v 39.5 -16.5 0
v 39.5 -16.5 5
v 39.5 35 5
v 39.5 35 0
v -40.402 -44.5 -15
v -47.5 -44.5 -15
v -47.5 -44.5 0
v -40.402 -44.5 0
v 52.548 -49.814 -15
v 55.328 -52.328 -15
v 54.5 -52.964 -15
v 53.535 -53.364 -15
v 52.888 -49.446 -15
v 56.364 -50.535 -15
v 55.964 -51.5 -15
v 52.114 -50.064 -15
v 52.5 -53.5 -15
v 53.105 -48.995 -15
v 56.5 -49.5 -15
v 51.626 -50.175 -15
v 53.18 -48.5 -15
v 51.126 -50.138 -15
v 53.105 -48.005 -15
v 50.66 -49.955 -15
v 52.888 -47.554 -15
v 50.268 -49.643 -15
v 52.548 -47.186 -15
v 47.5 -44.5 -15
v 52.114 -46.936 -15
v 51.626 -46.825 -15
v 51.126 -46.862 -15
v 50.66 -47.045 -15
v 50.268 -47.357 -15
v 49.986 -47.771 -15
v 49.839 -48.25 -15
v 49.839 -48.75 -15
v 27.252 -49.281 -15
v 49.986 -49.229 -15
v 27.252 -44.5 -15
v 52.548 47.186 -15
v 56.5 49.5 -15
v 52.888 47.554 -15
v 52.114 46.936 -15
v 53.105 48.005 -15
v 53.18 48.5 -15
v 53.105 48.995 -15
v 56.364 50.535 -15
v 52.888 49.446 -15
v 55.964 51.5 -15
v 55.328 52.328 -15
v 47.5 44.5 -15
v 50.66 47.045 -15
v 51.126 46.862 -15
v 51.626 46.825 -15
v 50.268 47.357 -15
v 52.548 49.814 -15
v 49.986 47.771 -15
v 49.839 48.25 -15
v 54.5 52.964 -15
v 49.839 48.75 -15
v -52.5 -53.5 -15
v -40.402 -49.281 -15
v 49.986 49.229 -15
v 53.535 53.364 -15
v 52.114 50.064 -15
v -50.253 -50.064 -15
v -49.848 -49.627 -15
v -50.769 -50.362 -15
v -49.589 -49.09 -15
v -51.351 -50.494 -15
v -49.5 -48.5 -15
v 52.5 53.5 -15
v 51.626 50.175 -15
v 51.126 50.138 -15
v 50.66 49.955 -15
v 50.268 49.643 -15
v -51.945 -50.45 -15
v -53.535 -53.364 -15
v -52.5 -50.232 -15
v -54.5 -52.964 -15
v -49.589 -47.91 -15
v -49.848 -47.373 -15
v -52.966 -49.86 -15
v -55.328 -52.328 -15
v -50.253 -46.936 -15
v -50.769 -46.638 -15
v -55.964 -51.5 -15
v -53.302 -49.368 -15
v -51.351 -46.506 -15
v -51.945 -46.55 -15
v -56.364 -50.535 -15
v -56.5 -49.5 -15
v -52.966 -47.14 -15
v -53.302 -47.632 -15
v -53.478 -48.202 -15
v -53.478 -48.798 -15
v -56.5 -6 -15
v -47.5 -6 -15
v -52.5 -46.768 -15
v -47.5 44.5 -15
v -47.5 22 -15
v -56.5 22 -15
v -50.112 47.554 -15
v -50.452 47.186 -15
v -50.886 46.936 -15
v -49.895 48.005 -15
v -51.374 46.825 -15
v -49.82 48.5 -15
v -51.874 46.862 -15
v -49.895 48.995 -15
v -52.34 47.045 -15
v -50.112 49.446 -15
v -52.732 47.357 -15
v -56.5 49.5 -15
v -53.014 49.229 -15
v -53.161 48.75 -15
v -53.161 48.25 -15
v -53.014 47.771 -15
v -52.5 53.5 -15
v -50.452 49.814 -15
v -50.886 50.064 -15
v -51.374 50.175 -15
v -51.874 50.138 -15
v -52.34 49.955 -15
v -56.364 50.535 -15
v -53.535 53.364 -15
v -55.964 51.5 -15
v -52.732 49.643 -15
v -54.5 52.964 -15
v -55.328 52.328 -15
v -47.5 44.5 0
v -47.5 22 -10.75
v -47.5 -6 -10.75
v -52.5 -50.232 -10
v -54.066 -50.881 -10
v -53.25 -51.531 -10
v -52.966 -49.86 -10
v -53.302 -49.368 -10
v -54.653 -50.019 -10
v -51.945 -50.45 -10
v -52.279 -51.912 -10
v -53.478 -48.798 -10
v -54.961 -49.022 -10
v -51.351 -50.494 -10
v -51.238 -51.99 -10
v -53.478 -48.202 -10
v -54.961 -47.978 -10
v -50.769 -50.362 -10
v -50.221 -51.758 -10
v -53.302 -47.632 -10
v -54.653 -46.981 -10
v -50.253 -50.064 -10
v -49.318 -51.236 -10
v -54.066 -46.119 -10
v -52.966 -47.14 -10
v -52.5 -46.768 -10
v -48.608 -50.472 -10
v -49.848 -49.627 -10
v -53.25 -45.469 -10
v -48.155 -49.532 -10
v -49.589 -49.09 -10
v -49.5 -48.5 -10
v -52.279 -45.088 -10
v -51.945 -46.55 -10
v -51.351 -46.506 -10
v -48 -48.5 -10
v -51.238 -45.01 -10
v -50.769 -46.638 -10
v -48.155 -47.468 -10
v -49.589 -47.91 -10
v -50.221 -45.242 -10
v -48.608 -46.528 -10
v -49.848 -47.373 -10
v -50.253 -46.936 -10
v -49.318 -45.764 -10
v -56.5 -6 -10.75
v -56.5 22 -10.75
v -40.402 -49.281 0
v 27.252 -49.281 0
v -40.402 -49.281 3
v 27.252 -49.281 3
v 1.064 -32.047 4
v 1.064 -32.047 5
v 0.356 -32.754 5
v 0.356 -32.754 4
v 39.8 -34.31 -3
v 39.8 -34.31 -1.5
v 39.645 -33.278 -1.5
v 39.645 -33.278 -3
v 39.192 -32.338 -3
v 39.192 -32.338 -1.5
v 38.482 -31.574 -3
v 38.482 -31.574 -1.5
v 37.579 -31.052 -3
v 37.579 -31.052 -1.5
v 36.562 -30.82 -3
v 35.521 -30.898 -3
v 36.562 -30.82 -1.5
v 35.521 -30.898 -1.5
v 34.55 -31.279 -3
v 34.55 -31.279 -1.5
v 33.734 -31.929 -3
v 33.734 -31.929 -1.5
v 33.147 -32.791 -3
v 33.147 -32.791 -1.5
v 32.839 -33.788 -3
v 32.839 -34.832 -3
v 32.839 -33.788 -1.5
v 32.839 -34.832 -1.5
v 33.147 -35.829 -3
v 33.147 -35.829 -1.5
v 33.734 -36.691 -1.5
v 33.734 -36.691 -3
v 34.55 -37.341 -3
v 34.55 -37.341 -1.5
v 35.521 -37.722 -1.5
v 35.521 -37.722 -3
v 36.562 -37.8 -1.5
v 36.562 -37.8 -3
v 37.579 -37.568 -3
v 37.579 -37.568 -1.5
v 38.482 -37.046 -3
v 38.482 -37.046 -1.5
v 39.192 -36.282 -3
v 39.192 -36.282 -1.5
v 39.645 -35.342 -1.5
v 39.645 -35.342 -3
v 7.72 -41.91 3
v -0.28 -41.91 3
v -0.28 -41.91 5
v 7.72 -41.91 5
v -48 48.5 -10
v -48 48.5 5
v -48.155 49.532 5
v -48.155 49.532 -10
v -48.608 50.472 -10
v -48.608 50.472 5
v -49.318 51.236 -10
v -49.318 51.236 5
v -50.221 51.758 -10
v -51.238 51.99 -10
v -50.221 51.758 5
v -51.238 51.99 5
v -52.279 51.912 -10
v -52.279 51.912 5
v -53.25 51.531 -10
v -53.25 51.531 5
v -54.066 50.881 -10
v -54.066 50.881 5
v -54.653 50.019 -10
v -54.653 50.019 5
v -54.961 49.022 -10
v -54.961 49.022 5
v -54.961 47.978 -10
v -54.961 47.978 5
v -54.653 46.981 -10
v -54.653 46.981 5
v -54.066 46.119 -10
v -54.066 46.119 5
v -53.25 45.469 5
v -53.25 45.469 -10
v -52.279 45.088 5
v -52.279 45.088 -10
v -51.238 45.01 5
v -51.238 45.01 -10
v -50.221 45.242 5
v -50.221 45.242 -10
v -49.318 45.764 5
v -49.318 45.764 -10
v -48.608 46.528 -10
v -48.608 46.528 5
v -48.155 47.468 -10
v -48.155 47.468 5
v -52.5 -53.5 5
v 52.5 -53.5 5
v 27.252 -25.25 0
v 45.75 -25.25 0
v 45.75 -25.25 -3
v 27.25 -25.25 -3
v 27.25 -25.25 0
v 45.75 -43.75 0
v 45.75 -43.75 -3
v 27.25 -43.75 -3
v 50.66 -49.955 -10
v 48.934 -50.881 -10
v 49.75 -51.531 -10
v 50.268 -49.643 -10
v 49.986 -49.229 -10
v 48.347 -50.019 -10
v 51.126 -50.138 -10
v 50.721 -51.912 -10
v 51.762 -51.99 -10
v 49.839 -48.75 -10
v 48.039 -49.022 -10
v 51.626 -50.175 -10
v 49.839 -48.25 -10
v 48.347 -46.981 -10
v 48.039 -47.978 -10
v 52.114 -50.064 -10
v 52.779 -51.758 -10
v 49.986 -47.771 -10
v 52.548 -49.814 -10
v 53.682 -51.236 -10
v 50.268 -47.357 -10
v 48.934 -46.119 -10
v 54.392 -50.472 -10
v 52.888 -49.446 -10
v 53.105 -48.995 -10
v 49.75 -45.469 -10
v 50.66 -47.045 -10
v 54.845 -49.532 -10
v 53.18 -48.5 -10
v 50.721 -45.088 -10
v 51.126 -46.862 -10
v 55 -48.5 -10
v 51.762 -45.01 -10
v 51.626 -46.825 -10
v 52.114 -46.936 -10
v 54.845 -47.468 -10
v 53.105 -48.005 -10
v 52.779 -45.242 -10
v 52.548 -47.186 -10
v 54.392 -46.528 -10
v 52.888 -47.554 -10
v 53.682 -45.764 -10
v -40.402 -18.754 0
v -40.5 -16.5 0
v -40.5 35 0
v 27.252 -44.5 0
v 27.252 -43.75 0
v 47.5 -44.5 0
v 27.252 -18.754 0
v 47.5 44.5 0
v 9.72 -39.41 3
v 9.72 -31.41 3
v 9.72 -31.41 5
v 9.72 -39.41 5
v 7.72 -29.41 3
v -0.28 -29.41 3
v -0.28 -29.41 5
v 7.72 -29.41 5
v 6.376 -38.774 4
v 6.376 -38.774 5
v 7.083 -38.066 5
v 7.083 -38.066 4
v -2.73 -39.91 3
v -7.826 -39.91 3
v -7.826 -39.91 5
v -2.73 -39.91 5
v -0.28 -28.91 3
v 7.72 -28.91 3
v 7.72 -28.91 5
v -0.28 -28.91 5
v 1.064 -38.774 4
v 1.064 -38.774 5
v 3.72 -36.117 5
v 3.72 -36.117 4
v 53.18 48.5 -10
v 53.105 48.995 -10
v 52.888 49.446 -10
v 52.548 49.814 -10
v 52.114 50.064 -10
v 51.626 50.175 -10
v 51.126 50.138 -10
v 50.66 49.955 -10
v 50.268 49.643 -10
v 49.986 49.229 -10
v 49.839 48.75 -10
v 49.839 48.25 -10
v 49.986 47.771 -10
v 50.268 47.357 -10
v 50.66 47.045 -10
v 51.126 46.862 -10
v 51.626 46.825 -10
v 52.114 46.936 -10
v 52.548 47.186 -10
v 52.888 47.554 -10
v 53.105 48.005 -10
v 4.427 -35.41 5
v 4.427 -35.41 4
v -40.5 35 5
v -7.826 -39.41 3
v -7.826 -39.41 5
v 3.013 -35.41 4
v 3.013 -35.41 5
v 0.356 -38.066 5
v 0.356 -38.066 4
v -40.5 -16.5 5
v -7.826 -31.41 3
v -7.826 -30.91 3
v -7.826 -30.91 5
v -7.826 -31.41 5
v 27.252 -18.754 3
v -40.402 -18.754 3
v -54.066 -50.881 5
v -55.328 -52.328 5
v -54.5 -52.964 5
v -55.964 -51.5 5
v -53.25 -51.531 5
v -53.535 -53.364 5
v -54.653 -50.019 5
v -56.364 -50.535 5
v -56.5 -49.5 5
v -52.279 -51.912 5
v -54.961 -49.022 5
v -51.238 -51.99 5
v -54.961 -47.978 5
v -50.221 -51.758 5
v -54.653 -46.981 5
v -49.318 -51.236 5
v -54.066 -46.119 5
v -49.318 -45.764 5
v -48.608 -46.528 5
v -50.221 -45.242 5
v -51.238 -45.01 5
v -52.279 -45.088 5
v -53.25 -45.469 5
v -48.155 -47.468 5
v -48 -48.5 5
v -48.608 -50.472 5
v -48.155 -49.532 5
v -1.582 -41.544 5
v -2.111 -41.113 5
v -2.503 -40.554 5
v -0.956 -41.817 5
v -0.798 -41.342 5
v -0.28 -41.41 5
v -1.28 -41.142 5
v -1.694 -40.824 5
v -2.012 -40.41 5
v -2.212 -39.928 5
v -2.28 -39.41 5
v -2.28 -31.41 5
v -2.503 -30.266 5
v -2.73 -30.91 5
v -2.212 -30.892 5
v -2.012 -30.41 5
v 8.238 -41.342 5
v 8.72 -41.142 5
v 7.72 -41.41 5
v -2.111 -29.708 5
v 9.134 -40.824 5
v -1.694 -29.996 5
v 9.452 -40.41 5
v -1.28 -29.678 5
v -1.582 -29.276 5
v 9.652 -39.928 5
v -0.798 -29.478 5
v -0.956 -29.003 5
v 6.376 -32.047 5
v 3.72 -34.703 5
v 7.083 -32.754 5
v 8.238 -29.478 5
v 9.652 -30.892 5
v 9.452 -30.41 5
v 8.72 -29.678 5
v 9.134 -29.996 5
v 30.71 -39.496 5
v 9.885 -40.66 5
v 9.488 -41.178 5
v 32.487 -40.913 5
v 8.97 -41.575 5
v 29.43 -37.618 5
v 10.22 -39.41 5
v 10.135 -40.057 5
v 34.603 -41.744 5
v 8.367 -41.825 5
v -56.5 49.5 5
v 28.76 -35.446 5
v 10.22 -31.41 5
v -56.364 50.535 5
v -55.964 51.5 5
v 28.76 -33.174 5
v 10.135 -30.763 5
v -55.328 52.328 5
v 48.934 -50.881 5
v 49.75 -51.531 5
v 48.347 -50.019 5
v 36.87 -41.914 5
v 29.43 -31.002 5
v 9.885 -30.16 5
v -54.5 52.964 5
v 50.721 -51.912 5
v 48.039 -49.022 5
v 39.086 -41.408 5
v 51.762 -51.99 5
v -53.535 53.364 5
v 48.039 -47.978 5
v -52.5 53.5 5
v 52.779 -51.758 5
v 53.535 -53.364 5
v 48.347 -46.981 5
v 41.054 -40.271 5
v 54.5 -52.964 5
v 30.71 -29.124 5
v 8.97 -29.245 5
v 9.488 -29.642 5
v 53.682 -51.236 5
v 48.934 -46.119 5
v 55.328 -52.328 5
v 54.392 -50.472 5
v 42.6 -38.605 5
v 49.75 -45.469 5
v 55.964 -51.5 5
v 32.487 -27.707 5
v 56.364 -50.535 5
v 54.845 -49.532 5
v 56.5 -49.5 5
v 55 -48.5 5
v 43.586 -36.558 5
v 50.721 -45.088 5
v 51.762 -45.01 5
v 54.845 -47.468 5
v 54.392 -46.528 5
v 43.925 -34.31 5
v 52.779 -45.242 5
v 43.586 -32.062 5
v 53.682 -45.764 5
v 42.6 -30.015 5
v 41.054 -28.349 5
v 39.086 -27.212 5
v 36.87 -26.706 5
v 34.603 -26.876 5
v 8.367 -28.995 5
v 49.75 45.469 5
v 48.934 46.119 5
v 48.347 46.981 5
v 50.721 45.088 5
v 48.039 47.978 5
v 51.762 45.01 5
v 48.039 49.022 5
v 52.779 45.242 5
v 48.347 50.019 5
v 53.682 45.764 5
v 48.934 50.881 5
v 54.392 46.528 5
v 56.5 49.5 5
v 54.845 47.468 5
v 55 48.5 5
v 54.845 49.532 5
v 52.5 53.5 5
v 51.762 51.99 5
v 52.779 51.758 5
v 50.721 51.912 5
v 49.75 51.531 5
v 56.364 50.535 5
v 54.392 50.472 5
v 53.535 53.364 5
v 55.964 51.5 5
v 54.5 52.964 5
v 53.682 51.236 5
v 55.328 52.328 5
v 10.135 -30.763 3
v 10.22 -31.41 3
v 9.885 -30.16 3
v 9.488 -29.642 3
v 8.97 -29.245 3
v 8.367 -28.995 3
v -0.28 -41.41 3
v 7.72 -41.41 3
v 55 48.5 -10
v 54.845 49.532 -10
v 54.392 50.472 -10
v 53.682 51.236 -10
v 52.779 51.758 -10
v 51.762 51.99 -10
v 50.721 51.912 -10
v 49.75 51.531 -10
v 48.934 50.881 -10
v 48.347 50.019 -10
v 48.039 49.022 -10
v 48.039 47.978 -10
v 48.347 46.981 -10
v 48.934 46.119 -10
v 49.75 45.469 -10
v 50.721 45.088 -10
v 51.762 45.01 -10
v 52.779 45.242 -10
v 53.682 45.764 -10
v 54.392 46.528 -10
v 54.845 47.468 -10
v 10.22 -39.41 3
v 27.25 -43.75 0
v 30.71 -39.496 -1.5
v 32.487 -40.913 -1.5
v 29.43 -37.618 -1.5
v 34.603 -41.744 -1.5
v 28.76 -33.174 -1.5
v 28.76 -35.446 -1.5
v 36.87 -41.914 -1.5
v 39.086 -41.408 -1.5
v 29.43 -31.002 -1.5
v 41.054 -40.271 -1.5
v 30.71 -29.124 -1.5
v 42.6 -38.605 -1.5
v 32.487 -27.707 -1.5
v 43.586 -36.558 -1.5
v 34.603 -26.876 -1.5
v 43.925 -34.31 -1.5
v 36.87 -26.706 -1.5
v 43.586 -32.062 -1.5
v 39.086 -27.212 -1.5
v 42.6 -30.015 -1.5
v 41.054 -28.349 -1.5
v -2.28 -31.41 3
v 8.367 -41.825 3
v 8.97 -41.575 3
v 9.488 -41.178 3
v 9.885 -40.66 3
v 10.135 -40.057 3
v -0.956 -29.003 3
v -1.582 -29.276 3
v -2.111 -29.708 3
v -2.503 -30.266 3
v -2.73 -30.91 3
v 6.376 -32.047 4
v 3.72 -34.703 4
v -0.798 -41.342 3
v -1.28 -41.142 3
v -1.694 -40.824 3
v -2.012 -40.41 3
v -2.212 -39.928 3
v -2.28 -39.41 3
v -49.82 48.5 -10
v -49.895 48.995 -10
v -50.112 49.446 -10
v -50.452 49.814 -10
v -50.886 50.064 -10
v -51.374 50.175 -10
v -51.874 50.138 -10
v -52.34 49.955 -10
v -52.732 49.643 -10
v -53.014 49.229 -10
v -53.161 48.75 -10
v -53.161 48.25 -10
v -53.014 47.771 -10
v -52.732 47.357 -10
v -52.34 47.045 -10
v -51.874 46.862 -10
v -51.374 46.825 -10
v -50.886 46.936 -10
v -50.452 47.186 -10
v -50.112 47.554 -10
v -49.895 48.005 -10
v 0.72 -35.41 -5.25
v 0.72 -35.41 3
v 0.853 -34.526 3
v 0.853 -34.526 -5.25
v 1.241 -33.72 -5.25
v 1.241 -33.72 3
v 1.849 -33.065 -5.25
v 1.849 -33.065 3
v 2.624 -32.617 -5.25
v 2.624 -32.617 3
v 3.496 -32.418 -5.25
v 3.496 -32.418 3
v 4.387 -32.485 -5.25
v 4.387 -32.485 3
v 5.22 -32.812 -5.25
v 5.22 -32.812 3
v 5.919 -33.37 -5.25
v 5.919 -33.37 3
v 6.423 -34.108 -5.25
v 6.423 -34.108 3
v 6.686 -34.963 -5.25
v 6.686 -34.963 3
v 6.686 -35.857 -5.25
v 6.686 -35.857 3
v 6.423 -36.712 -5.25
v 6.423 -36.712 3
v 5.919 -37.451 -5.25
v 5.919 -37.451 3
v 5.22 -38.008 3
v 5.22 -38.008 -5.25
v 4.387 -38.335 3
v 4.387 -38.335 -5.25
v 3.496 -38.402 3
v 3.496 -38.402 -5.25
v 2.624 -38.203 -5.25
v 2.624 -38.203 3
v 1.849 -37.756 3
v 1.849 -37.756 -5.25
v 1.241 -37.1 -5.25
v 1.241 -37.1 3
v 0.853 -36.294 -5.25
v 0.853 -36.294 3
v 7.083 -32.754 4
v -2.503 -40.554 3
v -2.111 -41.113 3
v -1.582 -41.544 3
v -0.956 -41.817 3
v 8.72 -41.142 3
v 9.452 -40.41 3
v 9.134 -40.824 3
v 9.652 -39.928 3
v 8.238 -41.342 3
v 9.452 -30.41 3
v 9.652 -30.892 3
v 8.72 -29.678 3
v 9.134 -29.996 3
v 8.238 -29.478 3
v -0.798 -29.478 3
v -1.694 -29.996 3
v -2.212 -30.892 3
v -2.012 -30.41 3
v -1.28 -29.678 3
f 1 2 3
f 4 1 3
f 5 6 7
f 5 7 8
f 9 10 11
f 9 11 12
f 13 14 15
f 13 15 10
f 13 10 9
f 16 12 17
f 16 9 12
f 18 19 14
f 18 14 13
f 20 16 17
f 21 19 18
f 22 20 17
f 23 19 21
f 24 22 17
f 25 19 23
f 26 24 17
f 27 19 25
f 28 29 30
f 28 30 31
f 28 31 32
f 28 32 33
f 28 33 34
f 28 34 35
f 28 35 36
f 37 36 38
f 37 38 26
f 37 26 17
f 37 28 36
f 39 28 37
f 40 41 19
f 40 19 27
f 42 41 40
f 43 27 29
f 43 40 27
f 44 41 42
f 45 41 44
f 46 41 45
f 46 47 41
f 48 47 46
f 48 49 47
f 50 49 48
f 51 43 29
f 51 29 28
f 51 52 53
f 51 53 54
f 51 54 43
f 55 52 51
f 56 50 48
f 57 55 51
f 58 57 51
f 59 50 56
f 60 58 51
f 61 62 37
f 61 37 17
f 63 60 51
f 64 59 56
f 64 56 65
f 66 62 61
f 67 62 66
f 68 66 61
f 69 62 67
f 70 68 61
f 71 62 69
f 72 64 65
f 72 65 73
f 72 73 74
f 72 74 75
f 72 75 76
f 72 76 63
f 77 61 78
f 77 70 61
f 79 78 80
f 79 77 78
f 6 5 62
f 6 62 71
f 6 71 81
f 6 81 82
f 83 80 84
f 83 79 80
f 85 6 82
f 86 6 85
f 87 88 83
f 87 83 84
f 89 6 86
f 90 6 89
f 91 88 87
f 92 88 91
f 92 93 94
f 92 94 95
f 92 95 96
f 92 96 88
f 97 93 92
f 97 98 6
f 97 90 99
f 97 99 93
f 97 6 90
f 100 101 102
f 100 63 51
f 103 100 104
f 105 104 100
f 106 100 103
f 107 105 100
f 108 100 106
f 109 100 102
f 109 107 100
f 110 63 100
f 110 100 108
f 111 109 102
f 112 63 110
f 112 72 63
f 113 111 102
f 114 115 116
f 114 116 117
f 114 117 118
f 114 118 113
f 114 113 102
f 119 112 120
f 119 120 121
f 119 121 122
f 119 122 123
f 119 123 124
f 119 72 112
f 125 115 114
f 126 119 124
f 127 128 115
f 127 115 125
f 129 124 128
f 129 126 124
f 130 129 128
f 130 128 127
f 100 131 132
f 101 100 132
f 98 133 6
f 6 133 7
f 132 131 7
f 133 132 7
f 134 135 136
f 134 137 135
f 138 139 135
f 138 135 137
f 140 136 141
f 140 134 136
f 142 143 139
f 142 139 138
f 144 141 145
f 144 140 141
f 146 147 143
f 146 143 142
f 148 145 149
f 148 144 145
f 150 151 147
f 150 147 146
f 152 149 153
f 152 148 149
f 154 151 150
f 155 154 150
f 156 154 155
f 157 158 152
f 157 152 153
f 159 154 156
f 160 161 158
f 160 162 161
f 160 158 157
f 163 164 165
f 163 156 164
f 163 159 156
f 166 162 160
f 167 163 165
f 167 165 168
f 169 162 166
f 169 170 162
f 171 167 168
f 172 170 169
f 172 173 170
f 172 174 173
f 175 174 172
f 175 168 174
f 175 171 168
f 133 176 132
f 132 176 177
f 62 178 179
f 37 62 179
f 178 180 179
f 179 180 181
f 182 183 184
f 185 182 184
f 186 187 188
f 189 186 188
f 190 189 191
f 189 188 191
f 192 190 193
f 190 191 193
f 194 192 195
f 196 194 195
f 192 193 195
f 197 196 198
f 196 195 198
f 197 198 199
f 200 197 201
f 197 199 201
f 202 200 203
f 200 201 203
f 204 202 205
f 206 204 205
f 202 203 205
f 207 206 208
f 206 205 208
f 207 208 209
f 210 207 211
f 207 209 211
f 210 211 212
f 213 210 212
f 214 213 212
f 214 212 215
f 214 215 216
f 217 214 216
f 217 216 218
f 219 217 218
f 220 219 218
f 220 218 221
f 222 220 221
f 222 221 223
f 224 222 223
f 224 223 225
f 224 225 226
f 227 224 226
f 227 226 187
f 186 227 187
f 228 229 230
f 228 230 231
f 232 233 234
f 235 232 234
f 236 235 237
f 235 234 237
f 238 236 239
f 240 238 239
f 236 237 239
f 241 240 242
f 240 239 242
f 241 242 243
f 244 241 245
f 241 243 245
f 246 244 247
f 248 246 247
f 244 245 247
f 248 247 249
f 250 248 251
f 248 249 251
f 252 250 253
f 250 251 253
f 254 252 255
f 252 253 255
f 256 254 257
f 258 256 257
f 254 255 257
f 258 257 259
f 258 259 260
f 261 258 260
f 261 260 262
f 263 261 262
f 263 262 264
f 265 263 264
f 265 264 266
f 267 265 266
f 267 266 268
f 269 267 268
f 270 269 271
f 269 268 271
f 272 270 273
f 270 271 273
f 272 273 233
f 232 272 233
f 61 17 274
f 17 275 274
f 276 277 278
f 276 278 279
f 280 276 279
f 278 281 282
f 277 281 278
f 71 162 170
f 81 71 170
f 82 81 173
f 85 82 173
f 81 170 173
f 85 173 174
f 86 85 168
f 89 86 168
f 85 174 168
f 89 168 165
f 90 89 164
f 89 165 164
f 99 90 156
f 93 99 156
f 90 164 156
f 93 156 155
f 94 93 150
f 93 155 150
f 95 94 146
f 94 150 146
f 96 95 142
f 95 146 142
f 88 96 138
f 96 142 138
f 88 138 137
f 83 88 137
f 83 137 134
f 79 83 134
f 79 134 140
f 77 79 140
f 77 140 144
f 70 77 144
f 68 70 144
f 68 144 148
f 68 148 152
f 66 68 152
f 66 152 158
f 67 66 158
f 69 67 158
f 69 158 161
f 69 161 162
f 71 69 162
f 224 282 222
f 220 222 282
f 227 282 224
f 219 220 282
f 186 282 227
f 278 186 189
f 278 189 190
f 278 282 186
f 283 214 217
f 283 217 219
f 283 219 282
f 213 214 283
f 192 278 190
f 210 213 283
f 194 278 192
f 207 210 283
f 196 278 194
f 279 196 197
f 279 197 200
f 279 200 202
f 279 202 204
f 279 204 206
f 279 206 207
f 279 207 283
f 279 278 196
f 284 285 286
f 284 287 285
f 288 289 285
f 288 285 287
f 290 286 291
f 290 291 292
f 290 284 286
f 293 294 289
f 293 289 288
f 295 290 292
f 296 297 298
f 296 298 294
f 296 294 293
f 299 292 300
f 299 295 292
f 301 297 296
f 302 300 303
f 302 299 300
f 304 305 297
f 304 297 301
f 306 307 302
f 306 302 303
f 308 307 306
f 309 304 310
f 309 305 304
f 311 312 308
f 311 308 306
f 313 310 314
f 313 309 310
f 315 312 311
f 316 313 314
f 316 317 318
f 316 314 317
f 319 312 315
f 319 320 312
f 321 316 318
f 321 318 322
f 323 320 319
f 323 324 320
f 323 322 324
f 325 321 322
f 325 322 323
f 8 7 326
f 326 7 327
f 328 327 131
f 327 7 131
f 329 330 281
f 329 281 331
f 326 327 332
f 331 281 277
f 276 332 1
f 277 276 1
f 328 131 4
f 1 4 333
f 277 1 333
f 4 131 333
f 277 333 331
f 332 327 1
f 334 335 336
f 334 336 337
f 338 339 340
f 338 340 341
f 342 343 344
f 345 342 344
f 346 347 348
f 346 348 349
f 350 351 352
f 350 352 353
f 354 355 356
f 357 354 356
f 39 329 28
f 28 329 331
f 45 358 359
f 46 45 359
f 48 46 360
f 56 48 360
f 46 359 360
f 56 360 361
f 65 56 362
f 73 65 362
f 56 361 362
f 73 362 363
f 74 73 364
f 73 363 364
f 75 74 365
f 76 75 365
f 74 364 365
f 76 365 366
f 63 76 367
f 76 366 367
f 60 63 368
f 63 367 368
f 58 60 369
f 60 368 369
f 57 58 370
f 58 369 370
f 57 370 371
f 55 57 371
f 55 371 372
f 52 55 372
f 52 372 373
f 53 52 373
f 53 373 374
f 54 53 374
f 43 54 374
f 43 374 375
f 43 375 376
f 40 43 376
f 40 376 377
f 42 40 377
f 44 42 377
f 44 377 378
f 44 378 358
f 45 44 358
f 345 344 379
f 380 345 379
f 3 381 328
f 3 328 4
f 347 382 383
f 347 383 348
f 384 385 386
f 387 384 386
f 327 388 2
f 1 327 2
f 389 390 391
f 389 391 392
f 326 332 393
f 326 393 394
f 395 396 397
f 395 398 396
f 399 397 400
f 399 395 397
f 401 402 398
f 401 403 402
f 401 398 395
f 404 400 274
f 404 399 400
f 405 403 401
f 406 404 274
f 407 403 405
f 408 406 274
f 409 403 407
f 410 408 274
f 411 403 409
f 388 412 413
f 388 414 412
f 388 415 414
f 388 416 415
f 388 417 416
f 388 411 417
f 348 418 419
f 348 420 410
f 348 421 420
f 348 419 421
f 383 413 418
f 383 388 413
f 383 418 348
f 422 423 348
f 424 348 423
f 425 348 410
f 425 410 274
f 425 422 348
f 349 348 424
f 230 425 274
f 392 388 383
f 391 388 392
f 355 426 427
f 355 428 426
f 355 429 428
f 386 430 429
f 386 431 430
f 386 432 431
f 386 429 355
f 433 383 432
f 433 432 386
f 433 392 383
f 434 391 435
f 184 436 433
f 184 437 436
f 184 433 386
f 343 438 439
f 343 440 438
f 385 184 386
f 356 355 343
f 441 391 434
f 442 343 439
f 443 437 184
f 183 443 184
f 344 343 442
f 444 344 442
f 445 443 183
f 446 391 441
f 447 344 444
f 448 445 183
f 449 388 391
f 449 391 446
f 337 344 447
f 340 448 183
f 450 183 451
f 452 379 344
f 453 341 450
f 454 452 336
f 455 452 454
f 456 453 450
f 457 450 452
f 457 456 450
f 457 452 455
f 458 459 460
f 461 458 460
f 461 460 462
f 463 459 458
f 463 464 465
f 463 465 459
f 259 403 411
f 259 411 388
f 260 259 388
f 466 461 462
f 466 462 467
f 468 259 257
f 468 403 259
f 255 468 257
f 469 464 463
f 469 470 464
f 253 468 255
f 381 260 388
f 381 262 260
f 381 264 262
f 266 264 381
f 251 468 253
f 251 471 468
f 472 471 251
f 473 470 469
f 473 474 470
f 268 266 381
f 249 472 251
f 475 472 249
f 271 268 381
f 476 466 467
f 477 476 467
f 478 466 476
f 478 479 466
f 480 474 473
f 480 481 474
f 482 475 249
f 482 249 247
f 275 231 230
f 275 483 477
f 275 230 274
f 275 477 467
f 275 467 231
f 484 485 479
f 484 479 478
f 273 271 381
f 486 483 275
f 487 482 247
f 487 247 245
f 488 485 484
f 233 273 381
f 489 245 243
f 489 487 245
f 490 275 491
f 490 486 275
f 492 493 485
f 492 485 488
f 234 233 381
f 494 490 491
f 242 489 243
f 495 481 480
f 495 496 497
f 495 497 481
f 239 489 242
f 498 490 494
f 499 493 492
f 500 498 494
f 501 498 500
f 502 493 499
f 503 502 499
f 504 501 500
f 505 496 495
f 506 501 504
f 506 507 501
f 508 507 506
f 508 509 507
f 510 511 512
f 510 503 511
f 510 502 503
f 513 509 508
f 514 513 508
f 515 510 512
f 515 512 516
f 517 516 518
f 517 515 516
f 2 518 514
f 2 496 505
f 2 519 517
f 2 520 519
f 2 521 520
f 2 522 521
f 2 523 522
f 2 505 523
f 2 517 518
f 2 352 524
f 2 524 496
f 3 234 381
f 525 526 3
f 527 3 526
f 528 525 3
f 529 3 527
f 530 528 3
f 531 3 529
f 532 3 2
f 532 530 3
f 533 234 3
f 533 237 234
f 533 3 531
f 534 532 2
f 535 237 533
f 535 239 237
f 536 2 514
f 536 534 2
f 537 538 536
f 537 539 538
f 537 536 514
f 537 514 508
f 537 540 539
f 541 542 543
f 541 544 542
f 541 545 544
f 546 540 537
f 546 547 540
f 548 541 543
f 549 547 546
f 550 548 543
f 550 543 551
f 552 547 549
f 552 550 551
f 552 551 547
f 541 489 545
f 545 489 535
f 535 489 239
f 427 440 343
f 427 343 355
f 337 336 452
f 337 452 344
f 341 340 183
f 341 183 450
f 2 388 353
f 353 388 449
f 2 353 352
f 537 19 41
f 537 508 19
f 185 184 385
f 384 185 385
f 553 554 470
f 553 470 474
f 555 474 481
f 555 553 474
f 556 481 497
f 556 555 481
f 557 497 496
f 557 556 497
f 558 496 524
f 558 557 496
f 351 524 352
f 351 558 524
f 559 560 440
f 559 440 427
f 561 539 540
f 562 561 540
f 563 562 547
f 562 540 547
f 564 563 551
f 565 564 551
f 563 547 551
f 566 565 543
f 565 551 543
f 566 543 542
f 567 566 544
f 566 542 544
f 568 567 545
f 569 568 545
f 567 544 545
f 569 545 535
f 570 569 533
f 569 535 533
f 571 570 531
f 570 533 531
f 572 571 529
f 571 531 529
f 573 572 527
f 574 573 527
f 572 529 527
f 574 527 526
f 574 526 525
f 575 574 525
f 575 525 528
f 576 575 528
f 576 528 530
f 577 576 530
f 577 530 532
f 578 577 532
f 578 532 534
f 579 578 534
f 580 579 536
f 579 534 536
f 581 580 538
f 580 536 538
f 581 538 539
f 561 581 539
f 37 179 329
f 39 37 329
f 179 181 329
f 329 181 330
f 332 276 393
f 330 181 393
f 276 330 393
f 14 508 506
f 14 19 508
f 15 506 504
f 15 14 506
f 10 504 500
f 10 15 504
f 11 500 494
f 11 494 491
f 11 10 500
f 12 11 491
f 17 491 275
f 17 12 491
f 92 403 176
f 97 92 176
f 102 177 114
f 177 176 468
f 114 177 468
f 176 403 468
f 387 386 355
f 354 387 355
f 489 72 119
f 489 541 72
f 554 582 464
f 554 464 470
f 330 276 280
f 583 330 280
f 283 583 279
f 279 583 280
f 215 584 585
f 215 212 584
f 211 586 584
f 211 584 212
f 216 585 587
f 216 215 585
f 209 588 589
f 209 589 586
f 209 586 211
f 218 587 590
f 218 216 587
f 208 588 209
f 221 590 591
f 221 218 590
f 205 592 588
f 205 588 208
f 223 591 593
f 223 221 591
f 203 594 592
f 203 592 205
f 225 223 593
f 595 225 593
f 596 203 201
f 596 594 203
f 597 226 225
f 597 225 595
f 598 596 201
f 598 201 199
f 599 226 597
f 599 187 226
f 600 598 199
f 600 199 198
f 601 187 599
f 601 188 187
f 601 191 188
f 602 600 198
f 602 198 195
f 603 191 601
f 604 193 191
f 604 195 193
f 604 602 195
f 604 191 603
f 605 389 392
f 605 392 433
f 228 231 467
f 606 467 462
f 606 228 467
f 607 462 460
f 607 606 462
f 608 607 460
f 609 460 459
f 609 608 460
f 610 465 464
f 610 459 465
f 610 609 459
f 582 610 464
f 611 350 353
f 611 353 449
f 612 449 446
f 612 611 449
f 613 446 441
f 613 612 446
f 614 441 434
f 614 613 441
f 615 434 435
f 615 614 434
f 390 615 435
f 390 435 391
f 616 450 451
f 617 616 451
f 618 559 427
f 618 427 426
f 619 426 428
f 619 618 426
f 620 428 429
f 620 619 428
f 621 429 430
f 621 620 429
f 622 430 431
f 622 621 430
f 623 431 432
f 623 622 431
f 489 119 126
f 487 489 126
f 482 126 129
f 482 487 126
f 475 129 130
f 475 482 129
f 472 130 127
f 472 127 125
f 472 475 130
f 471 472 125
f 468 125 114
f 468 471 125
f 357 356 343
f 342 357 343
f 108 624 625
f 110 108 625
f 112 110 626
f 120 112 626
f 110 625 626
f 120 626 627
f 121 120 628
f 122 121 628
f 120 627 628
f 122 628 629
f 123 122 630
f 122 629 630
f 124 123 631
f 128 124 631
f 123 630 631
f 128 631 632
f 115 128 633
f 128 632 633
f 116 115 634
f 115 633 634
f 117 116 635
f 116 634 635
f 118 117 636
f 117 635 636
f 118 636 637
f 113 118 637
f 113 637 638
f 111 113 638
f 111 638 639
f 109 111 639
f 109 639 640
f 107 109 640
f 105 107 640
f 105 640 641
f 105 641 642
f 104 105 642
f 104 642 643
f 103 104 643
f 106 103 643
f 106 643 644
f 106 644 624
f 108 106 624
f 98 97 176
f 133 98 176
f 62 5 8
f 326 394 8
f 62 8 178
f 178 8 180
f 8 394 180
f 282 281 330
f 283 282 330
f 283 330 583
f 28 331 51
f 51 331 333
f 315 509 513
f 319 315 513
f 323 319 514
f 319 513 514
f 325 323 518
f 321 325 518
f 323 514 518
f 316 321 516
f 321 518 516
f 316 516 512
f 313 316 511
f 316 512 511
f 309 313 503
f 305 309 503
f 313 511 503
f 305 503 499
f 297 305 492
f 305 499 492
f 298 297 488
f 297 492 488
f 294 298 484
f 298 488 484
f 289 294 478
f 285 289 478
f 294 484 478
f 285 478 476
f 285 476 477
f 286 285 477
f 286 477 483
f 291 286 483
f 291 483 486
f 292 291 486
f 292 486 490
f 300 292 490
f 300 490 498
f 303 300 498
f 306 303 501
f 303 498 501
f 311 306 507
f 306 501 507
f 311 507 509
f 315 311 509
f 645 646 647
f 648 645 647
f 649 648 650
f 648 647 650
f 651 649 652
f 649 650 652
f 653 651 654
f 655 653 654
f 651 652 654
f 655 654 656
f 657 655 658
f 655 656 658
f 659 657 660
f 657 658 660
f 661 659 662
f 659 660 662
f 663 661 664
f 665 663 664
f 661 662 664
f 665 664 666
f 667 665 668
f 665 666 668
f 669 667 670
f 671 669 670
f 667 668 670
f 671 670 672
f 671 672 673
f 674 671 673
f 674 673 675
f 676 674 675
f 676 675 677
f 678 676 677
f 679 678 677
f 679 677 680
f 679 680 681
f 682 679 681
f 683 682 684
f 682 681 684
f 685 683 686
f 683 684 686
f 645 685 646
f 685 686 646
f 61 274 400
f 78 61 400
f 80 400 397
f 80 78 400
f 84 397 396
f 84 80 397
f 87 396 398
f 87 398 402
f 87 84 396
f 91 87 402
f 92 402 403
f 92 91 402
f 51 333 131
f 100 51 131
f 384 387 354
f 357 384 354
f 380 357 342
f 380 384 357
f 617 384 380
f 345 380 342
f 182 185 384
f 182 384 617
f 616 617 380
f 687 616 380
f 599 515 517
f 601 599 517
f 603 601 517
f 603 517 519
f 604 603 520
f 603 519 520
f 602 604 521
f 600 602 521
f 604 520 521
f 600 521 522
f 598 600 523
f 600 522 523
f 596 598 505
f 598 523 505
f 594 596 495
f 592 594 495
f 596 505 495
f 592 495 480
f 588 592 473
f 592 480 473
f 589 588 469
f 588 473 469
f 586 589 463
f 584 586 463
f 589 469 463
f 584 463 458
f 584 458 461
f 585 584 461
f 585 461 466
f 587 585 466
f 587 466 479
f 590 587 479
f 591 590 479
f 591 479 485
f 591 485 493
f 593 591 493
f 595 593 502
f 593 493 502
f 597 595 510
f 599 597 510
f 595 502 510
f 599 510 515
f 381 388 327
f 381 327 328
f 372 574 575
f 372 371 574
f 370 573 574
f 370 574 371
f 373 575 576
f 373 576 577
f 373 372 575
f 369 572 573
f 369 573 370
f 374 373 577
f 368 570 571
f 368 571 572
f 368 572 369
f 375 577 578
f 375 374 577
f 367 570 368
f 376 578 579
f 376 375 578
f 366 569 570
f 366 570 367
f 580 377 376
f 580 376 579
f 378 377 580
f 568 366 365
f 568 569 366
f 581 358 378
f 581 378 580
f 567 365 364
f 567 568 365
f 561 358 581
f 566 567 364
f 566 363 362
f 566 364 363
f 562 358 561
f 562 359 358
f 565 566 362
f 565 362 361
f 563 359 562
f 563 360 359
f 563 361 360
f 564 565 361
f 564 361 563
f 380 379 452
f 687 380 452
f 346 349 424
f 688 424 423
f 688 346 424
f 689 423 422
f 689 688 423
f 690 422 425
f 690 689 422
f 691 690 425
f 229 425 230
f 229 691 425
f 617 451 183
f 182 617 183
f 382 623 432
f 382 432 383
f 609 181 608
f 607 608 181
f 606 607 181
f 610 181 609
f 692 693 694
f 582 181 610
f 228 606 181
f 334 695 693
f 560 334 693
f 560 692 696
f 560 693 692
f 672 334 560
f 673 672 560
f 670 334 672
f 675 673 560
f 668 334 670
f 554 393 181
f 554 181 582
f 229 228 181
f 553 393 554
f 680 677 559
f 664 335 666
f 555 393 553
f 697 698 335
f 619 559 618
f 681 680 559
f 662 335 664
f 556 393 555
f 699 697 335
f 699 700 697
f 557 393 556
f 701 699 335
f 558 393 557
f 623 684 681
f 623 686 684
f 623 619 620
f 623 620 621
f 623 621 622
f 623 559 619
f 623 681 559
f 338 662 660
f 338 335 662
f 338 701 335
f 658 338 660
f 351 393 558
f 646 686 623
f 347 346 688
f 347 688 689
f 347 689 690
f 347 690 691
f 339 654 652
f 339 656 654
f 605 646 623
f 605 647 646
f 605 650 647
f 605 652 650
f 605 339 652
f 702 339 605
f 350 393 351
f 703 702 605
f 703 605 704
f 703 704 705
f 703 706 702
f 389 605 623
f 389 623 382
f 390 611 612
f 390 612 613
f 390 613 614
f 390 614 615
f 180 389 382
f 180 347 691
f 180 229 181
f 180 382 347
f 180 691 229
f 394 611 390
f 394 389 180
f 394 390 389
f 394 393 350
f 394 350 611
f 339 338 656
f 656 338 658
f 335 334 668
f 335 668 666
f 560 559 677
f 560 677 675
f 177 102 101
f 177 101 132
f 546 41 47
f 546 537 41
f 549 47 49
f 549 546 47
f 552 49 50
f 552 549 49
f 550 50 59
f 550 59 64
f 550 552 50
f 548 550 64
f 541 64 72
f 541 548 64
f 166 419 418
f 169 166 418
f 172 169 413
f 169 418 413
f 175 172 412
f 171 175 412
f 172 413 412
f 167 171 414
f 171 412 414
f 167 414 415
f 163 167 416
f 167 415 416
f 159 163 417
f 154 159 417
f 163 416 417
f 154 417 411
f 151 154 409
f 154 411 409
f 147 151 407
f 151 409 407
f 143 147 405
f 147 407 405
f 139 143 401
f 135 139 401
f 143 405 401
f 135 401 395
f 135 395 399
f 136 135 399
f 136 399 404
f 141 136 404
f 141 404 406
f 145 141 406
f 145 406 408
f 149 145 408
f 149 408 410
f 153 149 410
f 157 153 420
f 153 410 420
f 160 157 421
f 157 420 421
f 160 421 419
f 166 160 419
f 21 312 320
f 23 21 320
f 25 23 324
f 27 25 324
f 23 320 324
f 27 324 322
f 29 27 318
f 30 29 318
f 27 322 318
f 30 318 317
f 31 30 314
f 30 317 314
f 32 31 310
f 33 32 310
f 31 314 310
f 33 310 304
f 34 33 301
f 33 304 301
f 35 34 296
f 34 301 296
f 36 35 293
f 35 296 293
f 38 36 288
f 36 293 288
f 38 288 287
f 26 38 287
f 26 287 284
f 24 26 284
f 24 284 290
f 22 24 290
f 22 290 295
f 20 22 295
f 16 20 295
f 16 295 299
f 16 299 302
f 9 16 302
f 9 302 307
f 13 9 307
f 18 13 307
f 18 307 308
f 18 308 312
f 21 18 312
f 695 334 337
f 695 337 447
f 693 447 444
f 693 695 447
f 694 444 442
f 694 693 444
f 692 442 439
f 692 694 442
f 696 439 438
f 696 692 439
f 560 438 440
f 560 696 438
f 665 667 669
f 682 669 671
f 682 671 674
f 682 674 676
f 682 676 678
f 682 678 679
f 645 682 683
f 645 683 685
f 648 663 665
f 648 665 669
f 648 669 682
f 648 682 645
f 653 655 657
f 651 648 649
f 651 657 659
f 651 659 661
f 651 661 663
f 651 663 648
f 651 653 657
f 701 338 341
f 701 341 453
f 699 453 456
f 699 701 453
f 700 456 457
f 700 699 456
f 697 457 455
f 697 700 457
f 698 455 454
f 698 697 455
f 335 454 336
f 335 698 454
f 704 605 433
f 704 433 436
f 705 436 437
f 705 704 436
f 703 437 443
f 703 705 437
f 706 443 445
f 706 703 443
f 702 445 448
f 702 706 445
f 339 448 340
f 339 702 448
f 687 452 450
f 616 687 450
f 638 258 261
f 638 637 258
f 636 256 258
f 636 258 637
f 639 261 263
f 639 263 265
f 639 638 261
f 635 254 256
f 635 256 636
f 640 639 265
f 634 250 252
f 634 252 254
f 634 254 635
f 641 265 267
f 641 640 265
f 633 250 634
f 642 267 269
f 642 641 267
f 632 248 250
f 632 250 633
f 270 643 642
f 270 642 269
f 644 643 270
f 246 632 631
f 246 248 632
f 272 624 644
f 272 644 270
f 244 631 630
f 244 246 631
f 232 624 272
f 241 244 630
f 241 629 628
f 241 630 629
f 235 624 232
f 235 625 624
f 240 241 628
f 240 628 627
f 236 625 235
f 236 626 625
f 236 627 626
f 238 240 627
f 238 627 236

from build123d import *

# Parameters (mm, degrees)
SKETCH1_W                        = 113
SKETCH1_H                        = 107
MAIN_BODY_DEPTH                  = 5
SKETCH19_W                       = 18.5
SKETCH19_H                       = 18.5
BOSS_EXTRUDE1_DEPTH              = 3
SKETCH7_R                        = 3.5
SKETCH7_W                        = 80
SKETCH7_H                        = 51.5
SCREEN_AND_KNOB_LOCATATION_DEPTH = 79.220841213
SKETCH11_W                       = 67.654258951
SKETCH11_H                       = 30.527744354
INTERNAL_CAVITY_DEPTH            = 3
BOARDERS_DEPTH                   = 15
SKETCH6_R                        = 3.5
SCREW_HEAD_PLACEMENT_DEPTH       = 15
SKETCH10_R                       = 1.68009103
SKETCH10_R_2                     = 2
SCREW_HOLE_THROUGH_DEPTH         = 80.243296246
SKETCH14_W                       = 4.25
SKETCH14_H                       = 28
SD_CARD_SLOT_DEPTH               = 10
SKETCH15_R                       = 3
BUTTON_PRESS_DEPTH               = 8.25
GROOVE_CUT_DEPTH                 = 80.865511956
CANCEL_DECAL_DEPTH               = 1
MAIN_BODY_FILLET_R               = 4
SKETCH18_R                       = 7.625
CUT_EXTRUDE1_DEPTH               = 6.5


with BuildPart() as part:
    # Sketch1 → Main Body (new body)
    with BuildSketch(Plane.XY):
        Rectangle(SKETCH1_W, SKETCH1_H)
    extrude(amount=MAIN_BODY_DEPTH)

    # Sketch19 → Boss-Extrude1 (add)
    with BuildSketch(Plane(origin=(0, 0, 0), x_dir=(-1, 0, 0), z_dir=(0, 0, -1))):
        with Locations((-36.5, -34.5)):
            Rectangle(SKETCH19_W, SKETCH19_H)
    extrude(amount=BOSS_EXTRUDE1_DEPTH)

    # Sketch7 → Screen and knob locatation (cut, through all)
    with BuildSketch(Plane.XY.offset(5)):
        with Locations((36.3, -34.31)):
            Circle(SKETCH7_R)
        with Locations((-0.5, 9.25)):
            Rectangle(SKETCH7_W, SKETCH7_H)
    extrude(amount=-SCREEN_AND_KNOB_LOCATATION_DEPTH, mode=Mode.SUBTRACT)

    # Sketch11 → Internal cavity (cut)
    with BuildSketch(Plane(origin=(0, 0, 0), x_dir=(-1, 0, 0), z_dir=(0, 0, -1))):
        with Locations((6.575112586, -34.017474747)):
            Rectangle(SKETCH11_W, SKETCH11_H)
    extrude(amount=-INTERNAL_CAVITY_DEPTH, mode=Mode.SUBTRACT)

    # Sketch12 → Boarders (add)
    with BuildSketch(Plane(origin=(0, 0, 0), x_dir=(-1, 0, 0), z_dir=(0, 0, -1))):
        Polygon((56.5, 43.5), (56.5, 53.5), (46.5, 53.5), (-46.5, 53.5), (-56.5, 53.5), (-56.5, 43.5), (-56.5, -43.5), (-56.5, -53.5), (-46.5, -53.5), (46.5, -53.5), (56.5, -53.5), (56.5, -43.5), align=None)
        Polygon((-47.5, 44.5), (47.5, 44.5), (47.5, -44.5), (40.402242061, -44.5), (40.402242061, -49.281346924), (-27.25201689, -49.281346924), (-27.25201689, -44.5), (-47.5, -44.5), align=None, mode=Mode.SUBTRACT)
    extrude(amount=BOARDERS_DEPTH)

    # Sketch6 → Screw Head Placement (cut)
    with BuildSketch(Plane.XY.offset(5)):
        with Locations((-51.5, 48.5)):
            Circle(SKETCH6_R)
        with Locations((-51.5, -48.5)):
            Circle(SKETCH6_R)
        with Locations((51.5, -48.5)):
            Circle(SKETCH6_R)
        with Locations((51.5, 48.5)):
            Circle(SKETCH6_R)
    extrude(amount=-SCREW_HEAD_PLACEMENT_DEPTH, mode=Mode.SUBTRACT)

    # Sketch10 → Screw hole through (cut, through all)
    with BuildSketch(Plane.XY.offset(-10)):
        with Locations((-51.5, 48.5)):
            Circle(SKETCH10_R)
        with Locations((51.5, 48.5)):
            Circle(SKETCH10_R)
        with Locations((51.5, -48.5)):
            Circle(SKETCH10_R)
        with Locations((-51.5, -48.5)):
            Circle(SKETCH10_R_2)
    extrude(amount=-SCREW_HOLE_THROUGH_DEPTH, mode=Mode.SUBTRACT)

    # Sketch14 → SD Card Slot (cut)
    with BuildSketch(Plane.ZY.offset(56.5)):
        with Locations((-12.875, 8)):
            Rectangle(SKETCH14_W, SKETCH14_H)
    extrude(amount=-SD_CARD_SLOT_DEPTH, mode=Mode.SUBTRACT)

    # Sketch15 → Button Press (add)
    with BuildSketch(Plane(origin=(0, 0, 3), x_dir=(-1, 0, 0), z_dir=(0, 0, -1))):
        with Locations((-3.7199, -35.4101)):
            Circle(SKETCH15_R)
    extrude(amount=BUTTON_PRESS_DEPTH)

    # Sketch16 → Groove Cut (cut, through all)
    with BuildSketch(Plane(origin=(0, 0, 3), x_dir=(-1, 0, 0), z_dir=(0, 0, -1))):
        with BuildLine():
            Line((2.2801, -39.4101), (7.826420717, -39.4101))
            Line((7.826420717, -39.4101), (7.826420717, -39.9101))
            Line((7.826420717, -39.9101), (2.729589743, -39.9101))
            ThreePointArc((2.729589743, -39.9101), (1.86123883, -41.346591673), (0.2801, -41.9101))
            Line((0.2801, -41.9101), (-7.7199, -41.9101))
            ThreePointArc((-7.7199, -41.9101), (-9.487666953, -41.177866953), (-10.2199, -39.4101))
            Line((-10.2199, -39.4101), (-10.2199, -31.4101))
            ThreePointArc((-10.2199, -31.4101), (-9.487666953, -29.642333047), (-7.7199, -28.9101))
            Line((-7.7199, -28.9101), (0.2801, -28.9101))
            ThreePointArc((0.2801, -28.9101), (1.86123883, -29.473608327), (2.729589743, -30.9101))
            Line((2.729589743, -30.9101), (7.826420717, -30.9101))
            Line((7.826420717, -30.9101), (7.826420717, -31.4101))
            Line((7.826420717, -31.4101), (2.2801, -31.4101))
            ThreePointArc((2.2801, -31.4101), (1.694313562, -29.995886438), (0.2801, -29.4101))
            Line((0.2801, -29.4101), (-7.7199, -29.4101))
            ThreePointArc((-7.7199, -29.4101), (-9.134113562, -29.995886438), (-9.7199, -31.4101))
            Line((-9.7199, -31.4101), (-9.7199, -39.4101))
            ThreePointArc((-9.7199, -39.4101), (-9.134113562, -40.824313562), (-7.7199, -41.4101))
            Line((-7.7199, -41.4101), (0.2801, -41.4101))
            ThreePointArc((0.2801, -41.4101), (1.694313562, -40.824313562), (2.2801, -39.4101))
        make_face()
    extrude(amount=-GROOVE_CUT_DEPTH, mode=Mode.SUBTRACT)

    # Sketch17 → CAncel Decal (cut)
    with BuildSketch(Plane.XY.offset(5)):
        Polygon((0.356446609, -32.753753391), (3.012793219, -35.4101), (0.356446609, -38.066446609), (1.063553391, -38.773553391), (3.7199, -36.117206781), (6.376246609, -38.773553391), (7.083353391, -38.066446609), (4.427006781, -35.4101), (7.083353391, -32.753753391), (6.376246609, -32.046646609), (3.7199, -34.702993219), (1.063553391, -32.046646609), align=None)
    extrude(amount=-CANCEL_DECAL_DEPTH, mode=Mode.SUBTRACT)

    # Main Body Fillet
    main_body_fillet_edges = [part.edges().sort_by_distance(p)[0] for p in [
        (-56.5, -53.5, -5),
        (56.5, -53.5, -5),
        (56.5, 53.5, -5),
        (-56.5, 53.5, -5),
    ]]
    fillet(main_body_fillet_edges, radius=MAIN_BODY_FILLET_R)

    # Sketch18 → Cut-Extrude1 (cut)
    with BuildSketch(Plane.XY.offset(5)):
        with Locations((36.3, -34.31)):
            Circle(SKETCH18_R)
    extrude(amount=-CUT_EXTRUDE1_DEPTH, mode=Mode.SUBTRACT)


solid = part.part
